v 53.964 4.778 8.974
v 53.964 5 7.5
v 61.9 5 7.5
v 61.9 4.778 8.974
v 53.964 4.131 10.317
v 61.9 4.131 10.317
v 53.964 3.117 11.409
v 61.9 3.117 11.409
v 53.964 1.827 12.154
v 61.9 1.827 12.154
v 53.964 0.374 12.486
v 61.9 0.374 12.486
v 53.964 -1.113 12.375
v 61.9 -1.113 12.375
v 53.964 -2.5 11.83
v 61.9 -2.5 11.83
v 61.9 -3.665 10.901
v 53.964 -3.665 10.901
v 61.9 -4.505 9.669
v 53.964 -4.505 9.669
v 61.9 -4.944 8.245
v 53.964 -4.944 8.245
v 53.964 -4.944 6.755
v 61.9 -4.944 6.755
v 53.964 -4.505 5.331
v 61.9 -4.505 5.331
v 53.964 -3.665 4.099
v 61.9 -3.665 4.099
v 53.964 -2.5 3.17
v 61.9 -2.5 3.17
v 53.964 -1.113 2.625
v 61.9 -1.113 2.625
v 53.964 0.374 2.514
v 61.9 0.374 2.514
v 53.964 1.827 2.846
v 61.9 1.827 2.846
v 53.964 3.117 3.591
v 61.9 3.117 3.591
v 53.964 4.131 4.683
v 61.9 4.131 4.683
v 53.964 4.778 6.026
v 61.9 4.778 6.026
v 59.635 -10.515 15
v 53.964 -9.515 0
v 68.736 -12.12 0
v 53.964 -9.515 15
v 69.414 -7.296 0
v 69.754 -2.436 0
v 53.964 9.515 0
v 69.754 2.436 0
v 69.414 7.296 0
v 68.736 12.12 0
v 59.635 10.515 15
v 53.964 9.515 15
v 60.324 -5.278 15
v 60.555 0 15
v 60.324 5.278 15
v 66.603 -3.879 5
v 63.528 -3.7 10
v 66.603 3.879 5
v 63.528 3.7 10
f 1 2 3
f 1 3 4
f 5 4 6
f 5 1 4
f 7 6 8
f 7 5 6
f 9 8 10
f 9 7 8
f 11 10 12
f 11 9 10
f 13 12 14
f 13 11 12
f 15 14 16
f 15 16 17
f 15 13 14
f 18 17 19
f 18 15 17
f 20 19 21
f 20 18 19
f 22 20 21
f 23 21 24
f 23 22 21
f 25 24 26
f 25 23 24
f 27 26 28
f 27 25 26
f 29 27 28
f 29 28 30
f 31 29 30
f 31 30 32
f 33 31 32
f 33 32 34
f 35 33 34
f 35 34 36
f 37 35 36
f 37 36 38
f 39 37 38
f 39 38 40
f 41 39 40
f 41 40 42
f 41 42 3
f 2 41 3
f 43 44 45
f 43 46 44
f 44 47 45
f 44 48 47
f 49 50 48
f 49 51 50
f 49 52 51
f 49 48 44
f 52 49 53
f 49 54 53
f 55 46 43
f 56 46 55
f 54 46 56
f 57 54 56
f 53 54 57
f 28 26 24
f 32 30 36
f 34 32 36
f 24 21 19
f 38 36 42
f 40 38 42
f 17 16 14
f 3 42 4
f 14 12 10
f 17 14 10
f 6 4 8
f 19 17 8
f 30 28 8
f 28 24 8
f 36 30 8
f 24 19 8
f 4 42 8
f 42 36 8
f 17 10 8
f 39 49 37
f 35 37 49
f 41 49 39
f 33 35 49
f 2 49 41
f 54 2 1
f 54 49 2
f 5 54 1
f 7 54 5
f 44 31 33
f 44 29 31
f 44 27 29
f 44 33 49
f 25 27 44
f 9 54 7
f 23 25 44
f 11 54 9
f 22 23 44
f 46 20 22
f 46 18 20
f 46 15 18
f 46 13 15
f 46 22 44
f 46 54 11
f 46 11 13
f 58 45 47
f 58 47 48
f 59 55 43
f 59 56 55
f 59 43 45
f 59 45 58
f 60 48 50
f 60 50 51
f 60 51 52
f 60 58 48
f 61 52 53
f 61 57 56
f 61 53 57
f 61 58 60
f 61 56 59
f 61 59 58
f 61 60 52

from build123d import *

# Parameters (mm, degrees)
F5_ANGLE_BACK = 10
F5_ANGLE      = 20
F3_DEPTH      = 15
F1_R          = 5
F4_DEPTH      = 61.9


with BuildPart() as f5:
    # F0 (on Front) → F5 (revolve)
    with BuildSketch(Plane.XZ, mode=Mode.PRIVATE) as f5_sk:
        Polygon((69.7967915205, 0), (60.5548890955, 15), (54.7967915205, 15), (54.7967915205, 0), align=None)
    revolve(f5_sk.sketch.rotate(Axis((0, 0, 12.625), (0, 0, 1)), -F5_ANGLE_BACK), axis=Axis((0, 0, 12.625), (0, 0, 1)), revolution_arc=F5_ANGLE)

    # F2 (on face) → F3 (join)
    with BuildSketch(Plane.XY.offset(15)):
        Polygon((54.7967915205, 9.6621528013), (53.9643051295, 9.5153629895), (53.9643051295, -9.5153629895), (54.7967915205, -9.6621528013), (56.5004897511, 0), align=None)
    extrude(amount=-F3_DEPTH)

    # F1 (on Right) → F4 (cut)
    with BuildSketch(Plane.YZ):
        with Locations((0, 7.5)):
            Circle(F1_R)
    extrude(amount=F4_DEPTH, mode=Mode.SUBTRACT)


solid = f5.part
